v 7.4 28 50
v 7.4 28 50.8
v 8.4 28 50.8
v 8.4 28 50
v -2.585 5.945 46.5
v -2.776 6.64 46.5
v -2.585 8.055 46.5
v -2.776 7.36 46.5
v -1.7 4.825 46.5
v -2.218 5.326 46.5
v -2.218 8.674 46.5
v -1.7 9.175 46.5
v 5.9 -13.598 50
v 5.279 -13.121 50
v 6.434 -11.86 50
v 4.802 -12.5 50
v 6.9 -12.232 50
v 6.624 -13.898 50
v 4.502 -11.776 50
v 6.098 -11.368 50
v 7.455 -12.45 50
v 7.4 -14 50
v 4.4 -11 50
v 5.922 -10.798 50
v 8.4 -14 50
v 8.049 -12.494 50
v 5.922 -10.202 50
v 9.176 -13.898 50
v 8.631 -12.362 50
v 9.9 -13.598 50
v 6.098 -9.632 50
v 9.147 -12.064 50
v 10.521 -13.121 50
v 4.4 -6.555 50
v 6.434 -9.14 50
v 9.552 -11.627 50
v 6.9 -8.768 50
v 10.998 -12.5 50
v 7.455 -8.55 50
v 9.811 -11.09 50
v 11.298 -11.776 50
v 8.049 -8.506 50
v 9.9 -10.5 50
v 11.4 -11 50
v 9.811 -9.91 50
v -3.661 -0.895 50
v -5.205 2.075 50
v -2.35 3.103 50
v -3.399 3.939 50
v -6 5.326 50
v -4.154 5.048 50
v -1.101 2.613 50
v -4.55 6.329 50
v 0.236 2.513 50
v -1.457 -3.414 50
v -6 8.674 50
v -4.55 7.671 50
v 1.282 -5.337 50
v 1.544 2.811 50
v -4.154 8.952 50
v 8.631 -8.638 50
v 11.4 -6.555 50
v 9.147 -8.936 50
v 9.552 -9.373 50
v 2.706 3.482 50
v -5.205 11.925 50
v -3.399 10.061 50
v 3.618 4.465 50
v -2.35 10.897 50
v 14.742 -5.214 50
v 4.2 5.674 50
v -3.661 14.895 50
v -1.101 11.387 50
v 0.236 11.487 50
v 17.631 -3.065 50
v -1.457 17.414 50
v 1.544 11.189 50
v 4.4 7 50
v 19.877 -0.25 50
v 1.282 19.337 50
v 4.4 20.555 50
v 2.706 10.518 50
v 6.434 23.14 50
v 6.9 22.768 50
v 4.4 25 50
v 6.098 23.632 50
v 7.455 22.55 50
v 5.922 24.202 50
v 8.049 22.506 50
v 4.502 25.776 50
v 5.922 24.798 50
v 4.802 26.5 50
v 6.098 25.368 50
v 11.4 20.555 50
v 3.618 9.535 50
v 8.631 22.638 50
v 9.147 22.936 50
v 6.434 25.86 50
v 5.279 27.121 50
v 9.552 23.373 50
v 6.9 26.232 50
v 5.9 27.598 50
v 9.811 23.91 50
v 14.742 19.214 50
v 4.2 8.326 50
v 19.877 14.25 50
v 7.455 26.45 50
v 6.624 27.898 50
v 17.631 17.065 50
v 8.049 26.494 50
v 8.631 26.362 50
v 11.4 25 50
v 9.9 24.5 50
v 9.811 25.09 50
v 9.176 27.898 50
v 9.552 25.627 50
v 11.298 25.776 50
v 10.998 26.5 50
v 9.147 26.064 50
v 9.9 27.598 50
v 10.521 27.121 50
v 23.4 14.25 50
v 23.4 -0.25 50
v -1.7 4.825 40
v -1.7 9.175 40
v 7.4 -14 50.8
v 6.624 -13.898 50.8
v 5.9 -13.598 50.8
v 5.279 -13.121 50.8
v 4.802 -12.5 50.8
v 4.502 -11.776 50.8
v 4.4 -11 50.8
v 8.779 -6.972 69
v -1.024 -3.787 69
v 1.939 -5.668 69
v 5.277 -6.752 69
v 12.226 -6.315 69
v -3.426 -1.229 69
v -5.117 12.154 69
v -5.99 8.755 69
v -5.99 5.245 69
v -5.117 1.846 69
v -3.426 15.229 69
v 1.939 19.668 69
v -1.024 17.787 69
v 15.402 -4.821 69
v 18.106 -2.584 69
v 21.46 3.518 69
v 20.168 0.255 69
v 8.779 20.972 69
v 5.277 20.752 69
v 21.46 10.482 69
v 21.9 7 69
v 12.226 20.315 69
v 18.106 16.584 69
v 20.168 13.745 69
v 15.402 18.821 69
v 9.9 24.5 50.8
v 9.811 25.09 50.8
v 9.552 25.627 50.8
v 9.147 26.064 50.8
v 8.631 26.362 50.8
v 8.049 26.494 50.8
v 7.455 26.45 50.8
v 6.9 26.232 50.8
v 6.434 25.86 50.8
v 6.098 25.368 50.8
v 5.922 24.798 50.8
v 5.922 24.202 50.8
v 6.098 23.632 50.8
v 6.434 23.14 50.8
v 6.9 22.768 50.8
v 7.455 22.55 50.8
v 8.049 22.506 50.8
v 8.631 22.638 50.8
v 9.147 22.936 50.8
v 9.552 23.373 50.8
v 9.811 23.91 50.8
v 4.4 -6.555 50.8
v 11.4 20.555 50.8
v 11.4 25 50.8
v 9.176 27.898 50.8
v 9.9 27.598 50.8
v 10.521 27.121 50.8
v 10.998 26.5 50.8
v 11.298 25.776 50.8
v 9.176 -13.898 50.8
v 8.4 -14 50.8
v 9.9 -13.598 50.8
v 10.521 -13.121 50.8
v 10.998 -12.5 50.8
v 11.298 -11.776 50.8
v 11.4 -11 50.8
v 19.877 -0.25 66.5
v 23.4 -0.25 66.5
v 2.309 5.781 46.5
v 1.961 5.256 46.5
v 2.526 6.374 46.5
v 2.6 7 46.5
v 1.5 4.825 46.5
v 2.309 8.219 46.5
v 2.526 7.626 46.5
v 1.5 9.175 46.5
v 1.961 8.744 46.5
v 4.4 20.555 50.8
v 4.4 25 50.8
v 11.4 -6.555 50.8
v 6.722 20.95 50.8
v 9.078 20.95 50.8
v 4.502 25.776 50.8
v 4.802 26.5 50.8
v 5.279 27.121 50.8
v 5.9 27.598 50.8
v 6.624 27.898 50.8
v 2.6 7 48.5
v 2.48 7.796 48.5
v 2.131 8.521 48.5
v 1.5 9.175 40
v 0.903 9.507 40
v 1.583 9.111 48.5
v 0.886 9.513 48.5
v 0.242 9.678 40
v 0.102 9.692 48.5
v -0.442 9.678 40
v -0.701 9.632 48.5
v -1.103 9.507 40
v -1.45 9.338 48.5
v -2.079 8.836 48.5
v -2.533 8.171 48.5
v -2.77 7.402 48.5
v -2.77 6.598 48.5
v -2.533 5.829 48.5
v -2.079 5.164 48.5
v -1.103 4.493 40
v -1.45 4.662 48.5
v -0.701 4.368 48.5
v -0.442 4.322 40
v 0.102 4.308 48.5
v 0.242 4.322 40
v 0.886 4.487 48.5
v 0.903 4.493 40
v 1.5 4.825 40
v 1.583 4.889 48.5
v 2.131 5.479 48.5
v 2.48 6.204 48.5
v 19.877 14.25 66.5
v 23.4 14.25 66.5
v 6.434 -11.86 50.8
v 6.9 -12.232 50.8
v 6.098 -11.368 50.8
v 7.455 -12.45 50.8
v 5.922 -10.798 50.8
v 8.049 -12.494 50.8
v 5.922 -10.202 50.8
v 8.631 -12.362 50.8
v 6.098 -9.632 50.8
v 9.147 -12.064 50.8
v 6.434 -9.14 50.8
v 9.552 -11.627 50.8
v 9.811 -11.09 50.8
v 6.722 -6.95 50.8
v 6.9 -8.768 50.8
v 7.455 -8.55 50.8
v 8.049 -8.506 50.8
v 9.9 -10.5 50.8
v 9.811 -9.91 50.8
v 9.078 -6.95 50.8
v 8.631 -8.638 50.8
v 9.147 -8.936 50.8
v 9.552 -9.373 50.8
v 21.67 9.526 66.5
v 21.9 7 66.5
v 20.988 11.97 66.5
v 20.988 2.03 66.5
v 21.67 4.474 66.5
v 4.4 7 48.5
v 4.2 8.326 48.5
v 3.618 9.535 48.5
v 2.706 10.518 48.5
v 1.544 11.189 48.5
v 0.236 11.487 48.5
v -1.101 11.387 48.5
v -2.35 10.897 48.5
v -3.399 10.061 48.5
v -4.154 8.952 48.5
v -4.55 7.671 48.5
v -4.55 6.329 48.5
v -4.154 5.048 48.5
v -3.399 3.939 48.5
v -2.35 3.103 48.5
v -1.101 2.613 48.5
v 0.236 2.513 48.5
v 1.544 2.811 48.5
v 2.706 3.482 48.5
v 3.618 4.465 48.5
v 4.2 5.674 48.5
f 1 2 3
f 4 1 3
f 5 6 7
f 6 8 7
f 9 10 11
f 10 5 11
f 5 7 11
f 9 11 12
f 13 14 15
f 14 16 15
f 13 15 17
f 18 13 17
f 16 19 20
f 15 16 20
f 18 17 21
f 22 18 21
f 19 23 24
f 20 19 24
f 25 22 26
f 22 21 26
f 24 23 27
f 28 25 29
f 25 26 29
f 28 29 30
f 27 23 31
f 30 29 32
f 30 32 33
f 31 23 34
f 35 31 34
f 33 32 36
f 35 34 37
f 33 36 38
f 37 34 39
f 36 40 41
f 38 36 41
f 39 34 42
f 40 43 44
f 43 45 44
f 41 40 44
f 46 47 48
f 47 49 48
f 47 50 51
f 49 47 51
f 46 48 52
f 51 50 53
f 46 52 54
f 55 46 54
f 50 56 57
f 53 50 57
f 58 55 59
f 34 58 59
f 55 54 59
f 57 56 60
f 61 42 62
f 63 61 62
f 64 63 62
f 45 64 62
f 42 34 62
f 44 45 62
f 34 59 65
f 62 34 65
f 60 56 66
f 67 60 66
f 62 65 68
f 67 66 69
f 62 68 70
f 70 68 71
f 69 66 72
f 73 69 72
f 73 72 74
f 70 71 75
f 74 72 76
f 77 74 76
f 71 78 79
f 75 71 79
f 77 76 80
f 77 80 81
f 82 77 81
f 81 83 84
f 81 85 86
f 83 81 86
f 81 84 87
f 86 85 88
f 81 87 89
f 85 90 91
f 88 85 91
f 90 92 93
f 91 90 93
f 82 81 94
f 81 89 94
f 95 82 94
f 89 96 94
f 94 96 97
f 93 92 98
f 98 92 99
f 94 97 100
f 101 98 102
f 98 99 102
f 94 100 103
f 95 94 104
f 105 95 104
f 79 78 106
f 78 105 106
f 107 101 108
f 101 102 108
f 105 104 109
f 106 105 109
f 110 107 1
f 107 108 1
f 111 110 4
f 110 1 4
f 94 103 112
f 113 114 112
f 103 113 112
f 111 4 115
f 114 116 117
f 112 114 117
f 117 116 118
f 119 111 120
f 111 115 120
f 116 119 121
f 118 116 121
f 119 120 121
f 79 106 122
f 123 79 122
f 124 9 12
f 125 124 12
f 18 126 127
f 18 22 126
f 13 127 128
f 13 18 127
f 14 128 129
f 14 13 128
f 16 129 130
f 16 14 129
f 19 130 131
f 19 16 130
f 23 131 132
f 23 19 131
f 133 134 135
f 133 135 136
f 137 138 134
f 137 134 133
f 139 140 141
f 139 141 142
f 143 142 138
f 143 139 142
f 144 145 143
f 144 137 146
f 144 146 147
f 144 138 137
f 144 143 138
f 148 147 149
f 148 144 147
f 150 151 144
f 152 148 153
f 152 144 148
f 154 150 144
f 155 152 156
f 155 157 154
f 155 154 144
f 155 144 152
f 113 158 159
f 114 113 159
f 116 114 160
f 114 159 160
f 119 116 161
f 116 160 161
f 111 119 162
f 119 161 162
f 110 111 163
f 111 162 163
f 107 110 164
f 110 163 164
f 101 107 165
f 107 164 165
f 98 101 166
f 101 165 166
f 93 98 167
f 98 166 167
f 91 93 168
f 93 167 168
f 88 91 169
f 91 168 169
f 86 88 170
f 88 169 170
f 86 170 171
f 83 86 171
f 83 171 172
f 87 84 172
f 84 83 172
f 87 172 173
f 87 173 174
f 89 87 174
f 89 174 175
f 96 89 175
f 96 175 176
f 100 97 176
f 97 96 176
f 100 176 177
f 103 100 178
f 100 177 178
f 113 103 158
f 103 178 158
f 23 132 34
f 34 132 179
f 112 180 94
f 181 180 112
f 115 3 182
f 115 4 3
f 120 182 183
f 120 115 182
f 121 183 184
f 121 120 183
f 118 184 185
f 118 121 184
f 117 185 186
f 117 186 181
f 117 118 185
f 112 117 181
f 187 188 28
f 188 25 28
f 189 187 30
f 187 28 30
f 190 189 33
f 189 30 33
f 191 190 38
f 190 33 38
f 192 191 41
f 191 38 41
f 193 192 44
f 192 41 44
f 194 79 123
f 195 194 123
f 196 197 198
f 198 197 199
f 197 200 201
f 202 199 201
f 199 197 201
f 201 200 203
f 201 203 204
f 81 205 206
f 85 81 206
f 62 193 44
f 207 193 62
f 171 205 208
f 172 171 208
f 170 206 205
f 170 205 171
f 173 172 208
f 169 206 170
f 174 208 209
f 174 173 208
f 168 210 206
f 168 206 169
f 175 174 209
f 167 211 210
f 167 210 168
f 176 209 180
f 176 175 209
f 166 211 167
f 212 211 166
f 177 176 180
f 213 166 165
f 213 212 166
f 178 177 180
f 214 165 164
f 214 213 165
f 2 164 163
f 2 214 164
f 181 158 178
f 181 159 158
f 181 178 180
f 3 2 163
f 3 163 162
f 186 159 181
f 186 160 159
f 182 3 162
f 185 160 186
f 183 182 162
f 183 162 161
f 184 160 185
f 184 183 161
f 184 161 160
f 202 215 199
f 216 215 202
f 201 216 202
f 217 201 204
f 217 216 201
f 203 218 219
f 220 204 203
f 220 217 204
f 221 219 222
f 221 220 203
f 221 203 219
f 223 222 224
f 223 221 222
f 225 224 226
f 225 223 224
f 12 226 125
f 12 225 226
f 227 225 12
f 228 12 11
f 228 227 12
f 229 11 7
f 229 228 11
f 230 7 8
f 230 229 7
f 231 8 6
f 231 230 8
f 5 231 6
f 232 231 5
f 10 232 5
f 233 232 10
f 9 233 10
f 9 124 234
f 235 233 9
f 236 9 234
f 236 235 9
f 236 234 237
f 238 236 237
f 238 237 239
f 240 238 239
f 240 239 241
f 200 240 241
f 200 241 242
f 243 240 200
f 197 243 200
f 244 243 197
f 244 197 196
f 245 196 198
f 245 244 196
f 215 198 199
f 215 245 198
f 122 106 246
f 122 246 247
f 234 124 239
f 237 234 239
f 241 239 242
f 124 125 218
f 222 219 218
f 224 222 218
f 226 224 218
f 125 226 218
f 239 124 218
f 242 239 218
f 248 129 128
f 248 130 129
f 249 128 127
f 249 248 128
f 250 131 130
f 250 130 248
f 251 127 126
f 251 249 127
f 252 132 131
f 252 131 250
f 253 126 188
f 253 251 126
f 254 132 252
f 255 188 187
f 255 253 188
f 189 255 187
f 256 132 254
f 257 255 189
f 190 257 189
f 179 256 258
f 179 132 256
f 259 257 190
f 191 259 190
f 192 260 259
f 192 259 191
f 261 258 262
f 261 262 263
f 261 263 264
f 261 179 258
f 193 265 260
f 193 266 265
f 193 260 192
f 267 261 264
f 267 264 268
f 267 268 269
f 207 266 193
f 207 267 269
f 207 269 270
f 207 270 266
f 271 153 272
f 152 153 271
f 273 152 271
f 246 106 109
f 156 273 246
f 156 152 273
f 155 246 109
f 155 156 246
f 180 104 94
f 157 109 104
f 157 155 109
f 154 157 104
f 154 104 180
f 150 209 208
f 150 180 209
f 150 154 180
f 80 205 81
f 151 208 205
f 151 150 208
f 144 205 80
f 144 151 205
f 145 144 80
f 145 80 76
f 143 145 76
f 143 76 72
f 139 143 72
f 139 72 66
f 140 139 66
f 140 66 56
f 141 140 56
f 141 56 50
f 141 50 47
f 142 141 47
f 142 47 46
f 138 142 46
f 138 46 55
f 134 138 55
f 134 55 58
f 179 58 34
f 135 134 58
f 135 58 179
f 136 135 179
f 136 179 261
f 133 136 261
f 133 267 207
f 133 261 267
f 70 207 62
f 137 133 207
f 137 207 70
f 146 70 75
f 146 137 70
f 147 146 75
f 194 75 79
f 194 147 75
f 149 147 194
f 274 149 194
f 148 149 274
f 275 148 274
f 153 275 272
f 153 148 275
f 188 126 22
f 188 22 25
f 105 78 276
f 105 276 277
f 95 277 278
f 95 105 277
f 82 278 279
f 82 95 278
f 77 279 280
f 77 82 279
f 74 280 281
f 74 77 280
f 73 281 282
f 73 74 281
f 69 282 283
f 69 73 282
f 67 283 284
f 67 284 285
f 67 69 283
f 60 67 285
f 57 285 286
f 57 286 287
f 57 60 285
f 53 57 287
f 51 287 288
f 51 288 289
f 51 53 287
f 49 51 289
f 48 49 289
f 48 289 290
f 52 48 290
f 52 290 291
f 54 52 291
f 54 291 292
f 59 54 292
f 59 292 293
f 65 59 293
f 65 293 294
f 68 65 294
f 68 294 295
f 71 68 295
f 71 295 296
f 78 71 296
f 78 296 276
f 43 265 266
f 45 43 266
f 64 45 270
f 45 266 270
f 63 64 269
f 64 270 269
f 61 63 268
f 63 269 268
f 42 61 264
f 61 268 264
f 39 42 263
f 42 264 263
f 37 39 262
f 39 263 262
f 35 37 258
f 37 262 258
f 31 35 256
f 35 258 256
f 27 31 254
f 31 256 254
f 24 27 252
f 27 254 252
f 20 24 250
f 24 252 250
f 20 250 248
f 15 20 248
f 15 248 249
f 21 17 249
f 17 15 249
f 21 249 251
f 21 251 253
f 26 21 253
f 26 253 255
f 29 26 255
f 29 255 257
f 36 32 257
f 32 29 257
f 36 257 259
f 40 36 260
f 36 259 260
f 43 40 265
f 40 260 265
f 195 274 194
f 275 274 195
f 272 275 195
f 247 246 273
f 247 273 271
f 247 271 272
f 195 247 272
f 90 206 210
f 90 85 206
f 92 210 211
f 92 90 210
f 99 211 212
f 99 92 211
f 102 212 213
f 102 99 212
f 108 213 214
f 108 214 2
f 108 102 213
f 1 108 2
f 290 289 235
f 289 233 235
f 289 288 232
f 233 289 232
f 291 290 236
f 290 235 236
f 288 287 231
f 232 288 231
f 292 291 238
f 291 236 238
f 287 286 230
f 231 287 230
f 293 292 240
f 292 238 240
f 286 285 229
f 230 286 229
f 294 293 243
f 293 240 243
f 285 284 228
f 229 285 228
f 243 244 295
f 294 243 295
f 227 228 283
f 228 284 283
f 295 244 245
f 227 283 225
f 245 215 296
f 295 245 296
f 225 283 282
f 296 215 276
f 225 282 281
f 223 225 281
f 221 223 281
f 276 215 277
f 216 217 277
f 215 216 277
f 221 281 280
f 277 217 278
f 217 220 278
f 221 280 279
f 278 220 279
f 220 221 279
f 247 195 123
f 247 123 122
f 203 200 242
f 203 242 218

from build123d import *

# Parameters (mm, degrees)
CYLINDER017_R     = 2
CYLINDER017_DEPTH = 20
CYLINDER016_R     = 2
CYLINDER016_DEPTH = 20
CYLINDER019_R     = 4.5
CYLINDER019_DEPTH = 19.5
BOX013_W          = 7
BOX013_H          = 42
BOX013_DEPTH      = 0.8
FILLET012_R       = 3
FILLET013_R       = 3
FILLET014_R       = 3
FILLET015_R       = 3
BOX012_W          = 10
BOX012_H          = 14.5
BOX012_DEPTH      = 16.5
CYLINDER015_R     = 14
CYLINDER015_DEPTH = 19
BOX014_W          = 10
BOX014_H          = 10
BOX014_DEPTH      = 10
BOX015_W          = 10
BOX015_H          = 10
BOX015_DEPTH      = 10
CYLINDER018_R     = 2.7
CYLINDER018_DEPTH = 28


with BuildPart() as cylinder017:
    # Cylinder017 → Cylinder017 (new body)
    with BuildSketch(Plane(origin=(0, -17.5, 14), x_dir=(1, 0, 0), z_dir=(0, 0, 1))):
        Circle(CYLINDER017_R)
    extrude(amount=CYLINDER017_DEPTH)


with BuildPart() as cylinder016:
    # Cylinder016 → Cylinder016 (new body)
    with BuildSketch(Plane(origin=(0, 17.5, 14), x_dir=(1, 0, 0), z_dir=(0, 0, 1))):
        Circle(CYLINDER016_R)
    extrude(amount=CYLINDER016_DEPTH)


with BuildPart() as shaft_boss003:
    # Cylinder019 → Cylinder019 (new body)
    with BuildSketch(Plane(origin=(-8, 0, 1), x_dir=(1, 0, 0), z_dir=(0, 0, 1))):
        Circle(CYLINDER019_R)
    extrude(amount=CYLINDER019_DEPTH)


with BuildPart() as fillet015:
    # Box013 → Box013 (new body)
    with BuildSketch(Plane(origin=(-3.5, -21, 18.2), x_dir=(1, 0, 0), z_dir=(0, 0, 1))):
        with Locations((3.5, 21)):
            Rectangle(BOX013_W, BOX013_H)
    extrude(amount=BOX013_DEPTH)

    # Fillet012
    fillet012_edges = [fillet015.edges().sort_by_distance(p)[0] for p in [
        (3.5, -21, 18.6),
    ]]
    fillet(fillet012_edges, radius=FILLET012_R)

    # Fillet013
    fillet013_edges = [fillet015.edges().sort_by_distance(p)[0] for p in [
        (-3.5, -21, 18.6),
    ]]
    fillet(fillet013_edges, radius=FILLET013_R)

    # Fillet014
    fillet014_edges = [fillet015.edges().sort_by_distance(p)[0] for p in [
        (-3.5, 21, 18.6),
    ]]
    fillet(fillet014_edges, radius=FILLET014_R)

    # Fillet015
    fillet015_edges = [fillet015.edges().sort_by_distance(p)[0] for p in [
        (3.5, 21, 18.6),
    ]]
    fillet(fillet015_edges, radius=FILLET015_R)


with BuildPart() as cube012:
    # Box012 → Box012 (new body)
    with BuildSketch(Plane(origin=(5.5, -7.25, 2.5), x_dir=(1, 0, 0), z_dir=(0, 0, 1))):
        with Locations((5, 7.25)):
            Rectangle(BOX012_W, BOX012_H)
    extrude(amount=BOX012_DEPTH)


with BuildPart() as motor_body003:
    # Cylinder015 → Cylinder015 (new body)
    with BuildSketch(Plane.XY):
        Circle(CYLINDER015_R)
    extrude(amount=CYLINDER015_DEPTH)

    # Fusion012: union Cube012
    add(cube012.part)

    # Fusion013: union Fillet015
    add(fillet015.part)

    # Fusion014: union shaft-boss003
    add(shaft_boss003.part)

    # Cut014: cut Cylinder016
    add(cylinder016.part, mode=Mode.SUBTRACT)

    # Cut015: cut Cylinder017
    add(cylinder017.part, mode=Mode.SUBTRACT)


with BuildPart() as cube014:
    # Box014 → Box014 (new body)
    with BuildSketch(Plane(origin=(-6.4, -5, 22.5), x_dir=(1, 0, 0), z_dir=(0, 0, 1))):
        with Locations((5, 5)):
            Rectangle(BOX014_W, BOX014_H)
    extrude(amount=BOX014_DEPTH)


with BuildPart() as cube015:
    # Box015 → Box015 (new body)
    with BuildSketch(Plane(origin=(-19.6, -5, 22.5), x_dir=(1, 0, 0), z_dir=(0, 0, 1))):
        with Locations((5, 5)):
            Rectangle(BOX015_W, BOX015_H)
    extrude(amount=BOX015_DEPTH)


with BuildPart() as f_28byj_48_motor003:
    # Cylinder018 → Cylinder018 (new body)
    with BuildSketch(Plane(origin=(-8, 0, 1), x_dir=(1, 0, 0), z_dir=(0, 0, 1))):
        Circle(CYLINDER018_R)
    extrude(amount=CYLINDER018_DEPTH)

    # Cut012: cut Cube015
    add(cube015.part, mode=Mode.SUBTRACT)

    # Cut013: cut Cube014
    add(cube014.part, mode=Mode.SUBTRACT)

    # Fusion015: union motor-body003
    add(motor_body003.part)


with BuildPart() as f_28byj_48_motor003_1:
    # Fusion015 placement: moved
    add(f_28byj_48_motor003.part.moved(Location((7.9, 7, 7))))


with BuildPart() as f_28byj48_motor:
    # Part__Mirroring: instance of 28BYJ-48-motor003
    add(f_28byj_48_motor003_1.part.mirror(Plane(origin=(0, 0, 0), x_dir=(0, 1, 0), z_dir=(0, 0, 1))))


with BuildPart() as f_28byj48_motor_1:
    # Part__Mirroring placement: moved
    add(f_28byj48_motor.part.moved(Location((0, 0, 76))))


solid = f_28byj48_motor_1.part
